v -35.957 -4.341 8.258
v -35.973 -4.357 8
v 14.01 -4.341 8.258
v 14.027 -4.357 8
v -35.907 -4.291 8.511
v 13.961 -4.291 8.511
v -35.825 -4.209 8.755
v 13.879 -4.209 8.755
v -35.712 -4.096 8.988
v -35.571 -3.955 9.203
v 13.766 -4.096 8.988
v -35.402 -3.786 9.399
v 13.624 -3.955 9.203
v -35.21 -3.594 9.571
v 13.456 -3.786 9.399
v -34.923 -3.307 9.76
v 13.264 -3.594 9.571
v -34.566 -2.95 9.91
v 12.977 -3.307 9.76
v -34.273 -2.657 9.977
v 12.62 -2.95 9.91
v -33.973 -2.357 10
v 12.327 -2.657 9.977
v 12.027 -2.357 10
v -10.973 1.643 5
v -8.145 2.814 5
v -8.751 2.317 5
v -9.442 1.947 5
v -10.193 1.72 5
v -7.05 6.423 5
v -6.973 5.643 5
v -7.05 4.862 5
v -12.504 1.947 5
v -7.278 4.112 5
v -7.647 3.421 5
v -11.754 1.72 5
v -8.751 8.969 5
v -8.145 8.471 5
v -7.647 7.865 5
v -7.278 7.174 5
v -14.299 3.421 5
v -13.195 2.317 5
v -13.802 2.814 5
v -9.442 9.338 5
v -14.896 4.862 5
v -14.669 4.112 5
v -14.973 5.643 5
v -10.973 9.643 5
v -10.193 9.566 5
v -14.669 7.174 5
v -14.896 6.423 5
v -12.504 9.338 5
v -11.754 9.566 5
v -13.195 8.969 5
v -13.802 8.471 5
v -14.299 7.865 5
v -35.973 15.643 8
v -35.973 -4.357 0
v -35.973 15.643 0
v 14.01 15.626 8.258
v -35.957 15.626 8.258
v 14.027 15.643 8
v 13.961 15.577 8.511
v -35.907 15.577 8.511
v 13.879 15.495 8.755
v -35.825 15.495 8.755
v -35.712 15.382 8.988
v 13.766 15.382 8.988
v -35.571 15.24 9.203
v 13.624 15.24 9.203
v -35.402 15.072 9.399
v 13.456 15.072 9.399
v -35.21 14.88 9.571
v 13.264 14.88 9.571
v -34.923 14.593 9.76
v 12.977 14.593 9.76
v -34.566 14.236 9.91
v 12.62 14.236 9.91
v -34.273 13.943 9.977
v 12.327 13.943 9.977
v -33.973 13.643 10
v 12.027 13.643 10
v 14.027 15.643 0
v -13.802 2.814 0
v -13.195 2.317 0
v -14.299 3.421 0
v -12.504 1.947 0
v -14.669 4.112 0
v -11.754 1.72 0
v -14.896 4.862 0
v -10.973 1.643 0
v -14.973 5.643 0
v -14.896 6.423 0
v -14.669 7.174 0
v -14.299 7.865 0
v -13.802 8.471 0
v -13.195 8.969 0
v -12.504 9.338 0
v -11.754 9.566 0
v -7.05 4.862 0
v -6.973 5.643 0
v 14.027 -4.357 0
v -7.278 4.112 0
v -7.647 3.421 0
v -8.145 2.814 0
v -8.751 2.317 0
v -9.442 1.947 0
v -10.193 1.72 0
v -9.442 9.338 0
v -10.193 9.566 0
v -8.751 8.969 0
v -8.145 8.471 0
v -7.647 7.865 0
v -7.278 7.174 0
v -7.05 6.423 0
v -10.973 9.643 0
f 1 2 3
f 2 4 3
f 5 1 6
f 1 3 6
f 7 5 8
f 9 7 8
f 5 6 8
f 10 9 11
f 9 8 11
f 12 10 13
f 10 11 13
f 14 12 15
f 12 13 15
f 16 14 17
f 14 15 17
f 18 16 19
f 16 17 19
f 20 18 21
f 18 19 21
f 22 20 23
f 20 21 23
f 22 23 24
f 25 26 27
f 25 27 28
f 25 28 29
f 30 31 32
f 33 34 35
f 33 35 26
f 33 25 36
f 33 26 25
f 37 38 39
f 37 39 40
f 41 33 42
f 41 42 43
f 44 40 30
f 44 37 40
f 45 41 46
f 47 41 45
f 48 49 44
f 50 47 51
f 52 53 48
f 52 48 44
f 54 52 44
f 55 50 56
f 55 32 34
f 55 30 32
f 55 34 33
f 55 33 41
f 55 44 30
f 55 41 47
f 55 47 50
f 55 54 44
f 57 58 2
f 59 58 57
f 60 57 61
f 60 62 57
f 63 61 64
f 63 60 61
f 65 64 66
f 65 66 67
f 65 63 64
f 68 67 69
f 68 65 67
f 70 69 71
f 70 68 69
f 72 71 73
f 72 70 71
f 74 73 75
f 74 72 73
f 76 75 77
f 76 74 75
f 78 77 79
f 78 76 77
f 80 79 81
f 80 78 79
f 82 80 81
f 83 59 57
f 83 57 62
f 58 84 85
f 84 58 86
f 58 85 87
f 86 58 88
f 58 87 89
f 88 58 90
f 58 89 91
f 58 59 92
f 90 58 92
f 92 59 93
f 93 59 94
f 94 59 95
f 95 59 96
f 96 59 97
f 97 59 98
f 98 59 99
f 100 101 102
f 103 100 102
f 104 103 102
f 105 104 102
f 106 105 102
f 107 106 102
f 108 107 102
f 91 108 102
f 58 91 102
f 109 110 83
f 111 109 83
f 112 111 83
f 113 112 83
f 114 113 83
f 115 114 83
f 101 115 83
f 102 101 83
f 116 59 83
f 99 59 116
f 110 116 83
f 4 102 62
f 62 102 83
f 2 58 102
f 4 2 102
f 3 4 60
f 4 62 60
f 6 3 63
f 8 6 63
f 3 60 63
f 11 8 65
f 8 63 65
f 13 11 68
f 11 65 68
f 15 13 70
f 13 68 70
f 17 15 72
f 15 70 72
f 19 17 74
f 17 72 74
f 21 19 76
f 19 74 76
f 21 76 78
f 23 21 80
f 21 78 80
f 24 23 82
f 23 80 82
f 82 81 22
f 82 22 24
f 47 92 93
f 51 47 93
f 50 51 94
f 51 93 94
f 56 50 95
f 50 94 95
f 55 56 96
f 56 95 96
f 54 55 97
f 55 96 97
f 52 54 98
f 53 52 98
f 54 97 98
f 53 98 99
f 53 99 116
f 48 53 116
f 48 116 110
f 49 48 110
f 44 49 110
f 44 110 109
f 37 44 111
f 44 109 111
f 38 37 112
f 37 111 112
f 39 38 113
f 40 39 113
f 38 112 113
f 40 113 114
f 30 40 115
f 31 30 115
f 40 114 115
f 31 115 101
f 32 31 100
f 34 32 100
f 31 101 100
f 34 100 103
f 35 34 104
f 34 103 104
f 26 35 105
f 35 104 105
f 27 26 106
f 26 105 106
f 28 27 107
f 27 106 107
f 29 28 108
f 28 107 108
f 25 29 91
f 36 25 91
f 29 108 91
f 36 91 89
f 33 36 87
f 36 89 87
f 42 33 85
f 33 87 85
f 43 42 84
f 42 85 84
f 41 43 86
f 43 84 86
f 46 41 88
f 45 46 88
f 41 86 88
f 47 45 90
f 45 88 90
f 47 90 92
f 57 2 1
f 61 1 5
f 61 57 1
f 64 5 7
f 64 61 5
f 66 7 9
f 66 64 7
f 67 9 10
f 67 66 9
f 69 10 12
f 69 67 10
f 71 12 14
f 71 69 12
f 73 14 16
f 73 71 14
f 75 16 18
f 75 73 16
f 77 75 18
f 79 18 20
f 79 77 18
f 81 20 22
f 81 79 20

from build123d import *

# Parameters (mm, degrees)
SKETCH_1_W          = 50
SKETCH_1_H          = 20
EXTRUDE_1_DEPTH     = 10
FILLET_1_R          = 2
SKETCH_2_R          = 4
CUT_EXTRUDE_1_DEPTH = 5


with BuildPart() as part:
    # 草图1 → 凸台-拉伸1 (new body)
    with BuildSketch(Plane.XY):
        with Locations((-10.973154362, 5.642841264)):
            Rectangle(SKETCH_1_W, SKETCH_1_H)
    extrude(amount=EXTRUDE_1_DEPTH)

    # 圆角1
    fillet_1_edges = [part.edges().sort_by_distance(p)[0] for p in [
        (14.026845638, 5.642841264, 10),
        (-10.973154362, 15.642841264, 10),
        (-35.973154362, 5.642841264, 10),
        (-10.973154362, -4.357158736, 10),
    ]]
    fillet(fillet_1_edges, radius=FILLET_1_R)

    # 草图2 → 切除-拉伸1 (cut)
    with BuildSketch(Plane(origin=(0, 0, 0), x_dir=(-1, 0, 0), z_dir=(0, 0, -1))):
        with Locations((10.973154362, 5.642841264)):
            Circle(SKETCH_2_R)
    extrude(amount=-CUT_EXTRUDE_1_DEPTH, mode=Mode.SUBTRACT)


solid = part.part
